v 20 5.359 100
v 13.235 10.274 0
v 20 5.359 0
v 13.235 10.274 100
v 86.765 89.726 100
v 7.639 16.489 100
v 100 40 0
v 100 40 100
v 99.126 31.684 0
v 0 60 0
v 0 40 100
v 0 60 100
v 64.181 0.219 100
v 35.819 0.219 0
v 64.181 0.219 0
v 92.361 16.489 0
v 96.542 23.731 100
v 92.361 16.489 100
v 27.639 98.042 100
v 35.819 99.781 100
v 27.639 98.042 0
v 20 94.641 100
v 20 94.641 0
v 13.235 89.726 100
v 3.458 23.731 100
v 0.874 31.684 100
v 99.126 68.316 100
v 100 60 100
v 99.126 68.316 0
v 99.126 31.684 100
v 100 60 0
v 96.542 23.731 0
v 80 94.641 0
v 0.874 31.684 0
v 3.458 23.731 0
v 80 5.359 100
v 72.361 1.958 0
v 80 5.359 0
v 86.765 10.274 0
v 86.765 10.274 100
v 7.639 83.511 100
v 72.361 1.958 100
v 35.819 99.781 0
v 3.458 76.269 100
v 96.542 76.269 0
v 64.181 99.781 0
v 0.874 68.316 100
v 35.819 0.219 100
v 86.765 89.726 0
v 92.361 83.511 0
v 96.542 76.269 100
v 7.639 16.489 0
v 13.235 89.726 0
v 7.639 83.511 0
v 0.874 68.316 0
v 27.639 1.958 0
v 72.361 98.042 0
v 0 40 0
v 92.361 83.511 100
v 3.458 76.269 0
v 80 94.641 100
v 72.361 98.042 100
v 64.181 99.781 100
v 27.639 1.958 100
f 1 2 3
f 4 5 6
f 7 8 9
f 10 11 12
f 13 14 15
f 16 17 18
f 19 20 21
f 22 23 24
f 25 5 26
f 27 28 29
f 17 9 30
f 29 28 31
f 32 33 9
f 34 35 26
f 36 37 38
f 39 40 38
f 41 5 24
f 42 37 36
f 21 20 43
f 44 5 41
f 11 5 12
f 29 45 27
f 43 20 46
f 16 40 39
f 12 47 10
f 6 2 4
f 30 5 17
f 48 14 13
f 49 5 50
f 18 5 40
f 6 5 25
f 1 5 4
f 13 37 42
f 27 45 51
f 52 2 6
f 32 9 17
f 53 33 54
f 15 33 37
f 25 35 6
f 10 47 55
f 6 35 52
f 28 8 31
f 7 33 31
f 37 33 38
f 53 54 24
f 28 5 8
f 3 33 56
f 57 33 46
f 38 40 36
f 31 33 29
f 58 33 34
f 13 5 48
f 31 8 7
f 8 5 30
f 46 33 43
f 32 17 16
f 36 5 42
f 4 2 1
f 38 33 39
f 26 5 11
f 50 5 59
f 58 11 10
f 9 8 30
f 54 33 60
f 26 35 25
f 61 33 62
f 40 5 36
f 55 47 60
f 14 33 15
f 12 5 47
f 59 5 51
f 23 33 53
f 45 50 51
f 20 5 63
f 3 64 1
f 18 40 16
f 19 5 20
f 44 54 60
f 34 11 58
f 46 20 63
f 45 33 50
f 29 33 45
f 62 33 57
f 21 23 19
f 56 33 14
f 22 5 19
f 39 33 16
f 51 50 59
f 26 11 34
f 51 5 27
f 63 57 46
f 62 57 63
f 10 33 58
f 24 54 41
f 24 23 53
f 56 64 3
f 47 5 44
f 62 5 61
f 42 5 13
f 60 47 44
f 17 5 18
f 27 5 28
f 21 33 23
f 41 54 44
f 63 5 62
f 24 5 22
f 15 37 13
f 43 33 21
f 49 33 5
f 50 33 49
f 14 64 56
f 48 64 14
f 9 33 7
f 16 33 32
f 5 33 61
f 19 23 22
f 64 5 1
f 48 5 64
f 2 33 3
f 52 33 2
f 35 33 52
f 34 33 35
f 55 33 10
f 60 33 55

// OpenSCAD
roundedcube(100,100,100,40);




module roundedcube(xdim ,ydim ,zdim,rdim){
hull(){
translate([rdim,rdim,0])cylinder(h=zdim,r=rdim);
translate([xdim-rdim,rdim,0])cylinder(h=zdim,r=rdim);

translate([rdim,ydim-rdim,0])cylinder(h=zdim,r=rdim);
translate([xdim-rdim,ydim-rdim,0])cylinder(h=zdim,r=rdim);
}
}
